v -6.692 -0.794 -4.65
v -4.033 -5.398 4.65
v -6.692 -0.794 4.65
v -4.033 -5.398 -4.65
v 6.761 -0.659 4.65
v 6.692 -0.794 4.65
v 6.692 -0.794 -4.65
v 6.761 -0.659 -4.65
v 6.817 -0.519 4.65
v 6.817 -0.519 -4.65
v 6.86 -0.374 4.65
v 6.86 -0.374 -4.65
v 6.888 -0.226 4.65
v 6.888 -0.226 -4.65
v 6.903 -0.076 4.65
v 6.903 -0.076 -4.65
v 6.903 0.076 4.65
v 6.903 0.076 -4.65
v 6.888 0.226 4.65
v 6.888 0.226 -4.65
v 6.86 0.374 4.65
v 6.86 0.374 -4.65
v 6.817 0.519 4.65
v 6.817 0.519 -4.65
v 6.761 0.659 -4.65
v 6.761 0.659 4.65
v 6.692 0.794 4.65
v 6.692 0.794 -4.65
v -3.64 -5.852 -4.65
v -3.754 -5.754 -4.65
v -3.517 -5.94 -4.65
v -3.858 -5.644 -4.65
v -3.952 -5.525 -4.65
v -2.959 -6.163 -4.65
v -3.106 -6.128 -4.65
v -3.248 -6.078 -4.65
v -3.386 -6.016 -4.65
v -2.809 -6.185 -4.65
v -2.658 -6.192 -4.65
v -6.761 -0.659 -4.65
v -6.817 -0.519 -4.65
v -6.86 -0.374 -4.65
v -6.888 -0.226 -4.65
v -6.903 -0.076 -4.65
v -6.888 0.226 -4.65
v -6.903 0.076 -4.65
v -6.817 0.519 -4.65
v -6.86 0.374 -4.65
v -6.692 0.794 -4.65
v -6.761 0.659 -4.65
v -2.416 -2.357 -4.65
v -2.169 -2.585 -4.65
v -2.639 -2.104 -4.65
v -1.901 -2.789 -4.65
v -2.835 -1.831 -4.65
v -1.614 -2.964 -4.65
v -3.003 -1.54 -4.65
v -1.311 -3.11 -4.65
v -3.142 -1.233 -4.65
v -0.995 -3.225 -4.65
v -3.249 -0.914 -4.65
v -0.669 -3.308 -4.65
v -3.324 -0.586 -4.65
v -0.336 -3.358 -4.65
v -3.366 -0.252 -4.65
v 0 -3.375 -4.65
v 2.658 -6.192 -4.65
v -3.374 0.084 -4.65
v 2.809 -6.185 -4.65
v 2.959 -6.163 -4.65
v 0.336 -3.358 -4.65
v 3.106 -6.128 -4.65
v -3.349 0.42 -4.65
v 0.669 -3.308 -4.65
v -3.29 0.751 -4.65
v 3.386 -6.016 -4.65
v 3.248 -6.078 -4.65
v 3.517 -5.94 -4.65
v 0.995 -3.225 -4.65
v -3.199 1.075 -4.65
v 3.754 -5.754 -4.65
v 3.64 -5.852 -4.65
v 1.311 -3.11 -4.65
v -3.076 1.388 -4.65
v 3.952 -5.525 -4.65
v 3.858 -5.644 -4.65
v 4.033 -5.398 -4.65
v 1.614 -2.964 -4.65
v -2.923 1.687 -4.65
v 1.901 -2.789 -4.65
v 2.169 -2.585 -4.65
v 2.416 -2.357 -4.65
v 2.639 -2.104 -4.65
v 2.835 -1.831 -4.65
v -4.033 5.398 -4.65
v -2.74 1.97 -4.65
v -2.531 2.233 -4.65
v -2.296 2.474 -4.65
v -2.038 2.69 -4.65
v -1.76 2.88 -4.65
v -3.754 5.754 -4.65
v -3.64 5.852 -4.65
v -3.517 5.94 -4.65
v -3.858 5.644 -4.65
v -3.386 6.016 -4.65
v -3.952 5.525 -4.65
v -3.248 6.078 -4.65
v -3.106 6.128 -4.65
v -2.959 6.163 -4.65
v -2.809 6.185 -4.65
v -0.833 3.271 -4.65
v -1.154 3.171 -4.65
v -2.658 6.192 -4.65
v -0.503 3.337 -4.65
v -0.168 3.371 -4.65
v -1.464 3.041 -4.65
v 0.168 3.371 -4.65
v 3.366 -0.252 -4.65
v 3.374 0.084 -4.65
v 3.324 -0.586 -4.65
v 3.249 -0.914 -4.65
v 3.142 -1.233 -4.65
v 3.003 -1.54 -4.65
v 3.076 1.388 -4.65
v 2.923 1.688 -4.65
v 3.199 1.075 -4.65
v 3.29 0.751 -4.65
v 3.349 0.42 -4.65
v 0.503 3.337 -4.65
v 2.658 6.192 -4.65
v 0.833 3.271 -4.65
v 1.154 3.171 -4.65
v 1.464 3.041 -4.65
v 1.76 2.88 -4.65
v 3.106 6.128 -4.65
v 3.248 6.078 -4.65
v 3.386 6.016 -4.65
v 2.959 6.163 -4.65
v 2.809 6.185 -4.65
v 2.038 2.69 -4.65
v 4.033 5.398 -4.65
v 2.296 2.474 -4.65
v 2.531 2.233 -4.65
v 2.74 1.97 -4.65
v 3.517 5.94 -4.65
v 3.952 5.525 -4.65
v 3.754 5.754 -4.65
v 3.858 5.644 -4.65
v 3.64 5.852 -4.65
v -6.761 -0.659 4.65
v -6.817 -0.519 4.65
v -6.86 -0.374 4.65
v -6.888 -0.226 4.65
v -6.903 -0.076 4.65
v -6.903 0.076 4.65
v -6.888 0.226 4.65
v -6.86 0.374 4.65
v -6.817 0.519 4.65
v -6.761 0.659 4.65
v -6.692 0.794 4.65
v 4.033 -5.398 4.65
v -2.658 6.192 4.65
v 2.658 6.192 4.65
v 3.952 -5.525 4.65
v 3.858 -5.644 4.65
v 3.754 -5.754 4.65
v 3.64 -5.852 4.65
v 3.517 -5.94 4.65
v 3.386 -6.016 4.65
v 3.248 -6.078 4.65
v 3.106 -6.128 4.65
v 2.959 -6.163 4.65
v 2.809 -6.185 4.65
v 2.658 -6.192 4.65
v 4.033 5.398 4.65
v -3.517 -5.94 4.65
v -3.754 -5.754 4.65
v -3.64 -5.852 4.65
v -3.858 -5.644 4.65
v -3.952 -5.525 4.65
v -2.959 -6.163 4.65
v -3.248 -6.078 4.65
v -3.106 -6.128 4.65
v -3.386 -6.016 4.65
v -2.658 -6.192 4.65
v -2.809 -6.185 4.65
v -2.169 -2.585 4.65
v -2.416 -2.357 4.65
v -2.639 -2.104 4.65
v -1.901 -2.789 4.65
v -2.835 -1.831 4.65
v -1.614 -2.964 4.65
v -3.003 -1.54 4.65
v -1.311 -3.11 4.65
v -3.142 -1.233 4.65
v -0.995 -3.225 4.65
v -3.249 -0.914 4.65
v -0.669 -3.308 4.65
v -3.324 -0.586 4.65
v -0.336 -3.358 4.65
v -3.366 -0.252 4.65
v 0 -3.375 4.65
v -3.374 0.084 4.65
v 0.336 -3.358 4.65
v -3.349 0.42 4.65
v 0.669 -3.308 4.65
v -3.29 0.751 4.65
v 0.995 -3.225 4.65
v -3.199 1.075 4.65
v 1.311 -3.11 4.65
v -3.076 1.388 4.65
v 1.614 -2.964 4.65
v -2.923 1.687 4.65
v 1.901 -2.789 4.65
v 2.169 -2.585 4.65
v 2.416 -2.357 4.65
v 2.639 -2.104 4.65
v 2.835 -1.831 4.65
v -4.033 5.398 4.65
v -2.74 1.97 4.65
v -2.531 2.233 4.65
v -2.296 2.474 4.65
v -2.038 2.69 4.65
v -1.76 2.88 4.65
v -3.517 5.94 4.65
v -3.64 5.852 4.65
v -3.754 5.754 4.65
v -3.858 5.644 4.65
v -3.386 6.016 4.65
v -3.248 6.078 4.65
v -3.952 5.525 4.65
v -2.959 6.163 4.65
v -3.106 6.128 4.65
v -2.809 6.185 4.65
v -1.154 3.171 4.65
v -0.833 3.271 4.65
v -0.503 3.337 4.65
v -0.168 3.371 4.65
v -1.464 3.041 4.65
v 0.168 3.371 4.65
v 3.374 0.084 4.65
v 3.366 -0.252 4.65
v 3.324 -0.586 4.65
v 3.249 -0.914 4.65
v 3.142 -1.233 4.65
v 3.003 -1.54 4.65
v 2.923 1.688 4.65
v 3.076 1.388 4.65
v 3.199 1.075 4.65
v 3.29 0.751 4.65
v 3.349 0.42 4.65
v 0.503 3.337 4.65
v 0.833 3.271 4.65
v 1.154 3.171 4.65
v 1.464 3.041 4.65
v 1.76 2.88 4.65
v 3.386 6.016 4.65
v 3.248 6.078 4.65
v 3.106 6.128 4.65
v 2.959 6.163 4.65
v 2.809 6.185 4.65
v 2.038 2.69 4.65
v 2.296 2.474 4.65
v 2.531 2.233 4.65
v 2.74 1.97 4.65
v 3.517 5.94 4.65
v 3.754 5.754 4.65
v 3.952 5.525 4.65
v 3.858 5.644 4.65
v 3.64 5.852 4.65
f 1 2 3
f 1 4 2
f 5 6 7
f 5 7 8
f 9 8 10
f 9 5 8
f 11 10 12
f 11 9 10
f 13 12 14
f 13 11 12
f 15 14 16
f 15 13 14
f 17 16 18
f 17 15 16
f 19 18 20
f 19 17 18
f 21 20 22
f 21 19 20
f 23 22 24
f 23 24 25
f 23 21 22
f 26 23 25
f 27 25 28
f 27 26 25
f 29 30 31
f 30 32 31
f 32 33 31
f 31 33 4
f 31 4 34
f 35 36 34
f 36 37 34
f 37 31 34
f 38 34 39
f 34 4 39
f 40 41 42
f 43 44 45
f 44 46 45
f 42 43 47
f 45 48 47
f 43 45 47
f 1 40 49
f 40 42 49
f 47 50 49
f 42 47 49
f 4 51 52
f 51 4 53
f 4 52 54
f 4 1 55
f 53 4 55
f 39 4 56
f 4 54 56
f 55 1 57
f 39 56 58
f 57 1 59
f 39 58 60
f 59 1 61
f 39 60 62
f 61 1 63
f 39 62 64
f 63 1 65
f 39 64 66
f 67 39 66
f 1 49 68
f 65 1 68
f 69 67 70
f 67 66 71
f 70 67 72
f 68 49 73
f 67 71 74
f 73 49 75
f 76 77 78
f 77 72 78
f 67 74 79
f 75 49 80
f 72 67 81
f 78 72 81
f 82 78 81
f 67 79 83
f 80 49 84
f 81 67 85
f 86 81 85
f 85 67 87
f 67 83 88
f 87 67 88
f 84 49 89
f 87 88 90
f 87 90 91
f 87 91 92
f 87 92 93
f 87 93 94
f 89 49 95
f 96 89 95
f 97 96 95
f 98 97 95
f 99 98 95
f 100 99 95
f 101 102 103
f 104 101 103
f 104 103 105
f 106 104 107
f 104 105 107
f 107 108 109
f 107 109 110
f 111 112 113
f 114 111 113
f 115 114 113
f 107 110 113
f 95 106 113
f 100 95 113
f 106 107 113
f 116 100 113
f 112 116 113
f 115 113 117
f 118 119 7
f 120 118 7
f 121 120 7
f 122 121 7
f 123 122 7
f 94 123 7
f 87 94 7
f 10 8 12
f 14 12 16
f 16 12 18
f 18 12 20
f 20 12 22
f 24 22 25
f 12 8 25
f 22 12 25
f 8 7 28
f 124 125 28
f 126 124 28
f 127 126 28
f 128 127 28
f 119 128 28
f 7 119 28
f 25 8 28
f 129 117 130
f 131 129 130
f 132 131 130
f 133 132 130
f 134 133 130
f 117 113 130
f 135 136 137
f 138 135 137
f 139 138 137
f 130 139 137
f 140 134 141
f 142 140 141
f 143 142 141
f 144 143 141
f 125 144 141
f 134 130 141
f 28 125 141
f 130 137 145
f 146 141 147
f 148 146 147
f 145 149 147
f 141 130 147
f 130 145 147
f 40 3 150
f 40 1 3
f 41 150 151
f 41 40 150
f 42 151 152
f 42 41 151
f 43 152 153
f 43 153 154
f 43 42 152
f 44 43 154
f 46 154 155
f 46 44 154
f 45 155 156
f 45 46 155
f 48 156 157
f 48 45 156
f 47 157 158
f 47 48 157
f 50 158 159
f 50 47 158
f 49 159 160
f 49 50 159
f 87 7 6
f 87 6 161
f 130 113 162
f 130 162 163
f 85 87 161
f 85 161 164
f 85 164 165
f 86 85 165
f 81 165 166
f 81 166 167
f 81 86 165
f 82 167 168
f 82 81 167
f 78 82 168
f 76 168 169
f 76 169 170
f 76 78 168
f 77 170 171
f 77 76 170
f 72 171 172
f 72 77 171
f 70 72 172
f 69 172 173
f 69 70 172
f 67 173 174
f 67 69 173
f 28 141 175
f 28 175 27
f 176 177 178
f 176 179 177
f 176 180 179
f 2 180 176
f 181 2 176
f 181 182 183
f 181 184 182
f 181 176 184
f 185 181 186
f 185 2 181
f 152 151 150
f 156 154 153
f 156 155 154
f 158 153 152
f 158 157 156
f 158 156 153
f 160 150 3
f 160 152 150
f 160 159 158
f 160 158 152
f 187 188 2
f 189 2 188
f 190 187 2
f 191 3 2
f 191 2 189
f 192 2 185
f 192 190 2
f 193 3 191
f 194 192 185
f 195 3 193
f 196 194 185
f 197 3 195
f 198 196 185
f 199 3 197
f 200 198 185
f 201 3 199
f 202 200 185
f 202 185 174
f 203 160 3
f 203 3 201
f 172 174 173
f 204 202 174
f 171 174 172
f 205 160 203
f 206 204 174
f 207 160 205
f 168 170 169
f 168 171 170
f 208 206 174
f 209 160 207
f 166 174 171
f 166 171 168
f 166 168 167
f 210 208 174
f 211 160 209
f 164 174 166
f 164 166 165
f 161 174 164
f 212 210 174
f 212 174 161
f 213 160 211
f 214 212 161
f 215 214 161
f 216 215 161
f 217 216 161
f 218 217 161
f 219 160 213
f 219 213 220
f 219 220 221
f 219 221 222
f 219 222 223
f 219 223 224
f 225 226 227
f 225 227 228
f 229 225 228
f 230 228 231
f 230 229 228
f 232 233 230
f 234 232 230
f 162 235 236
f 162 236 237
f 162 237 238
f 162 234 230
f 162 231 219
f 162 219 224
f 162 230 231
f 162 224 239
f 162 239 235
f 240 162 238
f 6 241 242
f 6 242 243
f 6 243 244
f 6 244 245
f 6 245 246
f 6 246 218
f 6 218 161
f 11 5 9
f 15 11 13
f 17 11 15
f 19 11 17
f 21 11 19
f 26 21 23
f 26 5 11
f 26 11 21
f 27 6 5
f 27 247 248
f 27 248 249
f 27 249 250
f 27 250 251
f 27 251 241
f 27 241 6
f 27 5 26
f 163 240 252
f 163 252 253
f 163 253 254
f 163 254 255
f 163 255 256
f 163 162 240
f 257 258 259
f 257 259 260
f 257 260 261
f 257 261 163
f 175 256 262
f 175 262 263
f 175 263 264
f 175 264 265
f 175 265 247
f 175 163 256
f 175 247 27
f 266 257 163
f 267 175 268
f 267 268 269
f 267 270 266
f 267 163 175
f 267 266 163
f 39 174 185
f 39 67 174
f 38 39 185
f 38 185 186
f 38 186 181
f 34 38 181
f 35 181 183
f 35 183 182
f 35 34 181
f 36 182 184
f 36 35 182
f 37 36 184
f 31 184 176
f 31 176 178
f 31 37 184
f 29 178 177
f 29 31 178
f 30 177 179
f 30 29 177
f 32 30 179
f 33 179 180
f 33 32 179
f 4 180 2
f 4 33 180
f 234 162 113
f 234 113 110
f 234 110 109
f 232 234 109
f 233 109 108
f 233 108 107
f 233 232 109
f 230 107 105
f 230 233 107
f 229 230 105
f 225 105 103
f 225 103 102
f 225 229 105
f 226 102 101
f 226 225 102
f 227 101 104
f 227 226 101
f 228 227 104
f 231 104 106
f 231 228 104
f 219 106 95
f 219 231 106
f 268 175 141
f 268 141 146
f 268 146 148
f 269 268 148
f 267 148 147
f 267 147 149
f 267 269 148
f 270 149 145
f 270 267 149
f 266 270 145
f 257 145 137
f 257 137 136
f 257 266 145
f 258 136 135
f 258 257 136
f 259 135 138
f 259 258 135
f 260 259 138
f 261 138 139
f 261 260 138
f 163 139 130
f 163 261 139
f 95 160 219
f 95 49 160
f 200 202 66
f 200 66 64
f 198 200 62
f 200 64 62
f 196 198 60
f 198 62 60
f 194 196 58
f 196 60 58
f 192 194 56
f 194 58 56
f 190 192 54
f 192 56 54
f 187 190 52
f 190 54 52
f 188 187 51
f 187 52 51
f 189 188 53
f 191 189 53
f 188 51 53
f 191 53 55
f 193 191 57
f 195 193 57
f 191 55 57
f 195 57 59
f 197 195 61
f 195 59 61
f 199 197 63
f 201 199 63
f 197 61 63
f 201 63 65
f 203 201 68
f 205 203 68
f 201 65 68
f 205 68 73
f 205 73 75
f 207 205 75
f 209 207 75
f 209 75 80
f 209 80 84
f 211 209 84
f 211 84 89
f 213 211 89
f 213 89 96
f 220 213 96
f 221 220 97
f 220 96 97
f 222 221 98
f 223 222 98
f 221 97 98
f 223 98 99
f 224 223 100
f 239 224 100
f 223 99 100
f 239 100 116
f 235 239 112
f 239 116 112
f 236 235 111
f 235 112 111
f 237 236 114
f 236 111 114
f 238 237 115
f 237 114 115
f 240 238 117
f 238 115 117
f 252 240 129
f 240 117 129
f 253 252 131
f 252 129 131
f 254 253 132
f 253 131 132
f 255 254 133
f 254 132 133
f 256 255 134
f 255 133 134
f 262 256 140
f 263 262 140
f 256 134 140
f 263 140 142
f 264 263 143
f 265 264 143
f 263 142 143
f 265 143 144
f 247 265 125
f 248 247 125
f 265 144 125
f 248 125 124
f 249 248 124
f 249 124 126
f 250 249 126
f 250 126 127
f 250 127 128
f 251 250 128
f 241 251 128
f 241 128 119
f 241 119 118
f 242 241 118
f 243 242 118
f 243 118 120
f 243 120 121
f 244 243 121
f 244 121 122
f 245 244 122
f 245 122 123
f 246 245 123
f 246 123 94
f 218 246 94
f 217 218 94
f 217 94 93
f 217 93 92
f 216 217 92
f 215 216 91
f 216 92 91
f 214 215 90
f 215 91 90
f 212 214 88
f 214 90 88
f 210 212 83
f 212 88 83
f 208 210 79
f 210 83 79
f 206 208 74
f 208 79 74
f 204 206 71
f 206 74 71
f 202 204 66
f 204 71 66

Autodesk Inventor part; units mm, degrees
ref_plane "YZ Plane" through (0, 0, 0) normal (1, 0, 0) x (0, 1, 0)
ref_plane "XZ Plane" through (0, 0, 0) normal (0, 1, 0) x (-1, 0, 0)
ref_plane "XY Plane" through (0, 0, 0) normal (0, 0, 1) x (1, 0, 0)
sketch "Sketch1" plane through (0, 0, 0) normal (0, 0, 1) x (1, 0, 0)
  circle A0 centre (0, 0) radius 7.15
  line L0 (-7.15, 0) -> (-3.575, 6.1921)
  line L1 (-3.575, 6.1921) -> (3.575, 6.1921)
  line L2 (3.575, 6.1921) -> (7.15, 0)
  line L3 (7.15, 0) -> (3.575, -6.1921)
  line L4 (3.575, -6.1921) -> (-3.575, -6.1921)
  line L5 (-3.575, -6.1921) -> (-7.15, 0)
  dimension "d0" = 14.3
extrude "Extrusion1" add sketch "Sketch1" along normal mid plane 9.3 contours L3 L4 L5 L0 L1 L2
sketch "Sketch2" plane through (0, 0, 4.65) normal (0, 0, 1) x (1, 0, 0)
  point P0 (0, 0)
hole "Hole1" at (0, 0, 4.65) direction (0, 0, -1) diameter 6.75 end through all
thread "Thread1" size "M8x1.25" class "6H" standard "ANSI Metric M Profile" full length
fillet "Fillet1" radius 1.5875 6 edges at (-3.575, -6.1921, 0) (-7.15, 0, 0) (-3.575, 6.1921, 0) (3.575, 6.1921, 0) (7.15, 0, 0) (3.575, -6.1921, 0)
properties part number "CNC-1.1v-B-1-( nut )"
